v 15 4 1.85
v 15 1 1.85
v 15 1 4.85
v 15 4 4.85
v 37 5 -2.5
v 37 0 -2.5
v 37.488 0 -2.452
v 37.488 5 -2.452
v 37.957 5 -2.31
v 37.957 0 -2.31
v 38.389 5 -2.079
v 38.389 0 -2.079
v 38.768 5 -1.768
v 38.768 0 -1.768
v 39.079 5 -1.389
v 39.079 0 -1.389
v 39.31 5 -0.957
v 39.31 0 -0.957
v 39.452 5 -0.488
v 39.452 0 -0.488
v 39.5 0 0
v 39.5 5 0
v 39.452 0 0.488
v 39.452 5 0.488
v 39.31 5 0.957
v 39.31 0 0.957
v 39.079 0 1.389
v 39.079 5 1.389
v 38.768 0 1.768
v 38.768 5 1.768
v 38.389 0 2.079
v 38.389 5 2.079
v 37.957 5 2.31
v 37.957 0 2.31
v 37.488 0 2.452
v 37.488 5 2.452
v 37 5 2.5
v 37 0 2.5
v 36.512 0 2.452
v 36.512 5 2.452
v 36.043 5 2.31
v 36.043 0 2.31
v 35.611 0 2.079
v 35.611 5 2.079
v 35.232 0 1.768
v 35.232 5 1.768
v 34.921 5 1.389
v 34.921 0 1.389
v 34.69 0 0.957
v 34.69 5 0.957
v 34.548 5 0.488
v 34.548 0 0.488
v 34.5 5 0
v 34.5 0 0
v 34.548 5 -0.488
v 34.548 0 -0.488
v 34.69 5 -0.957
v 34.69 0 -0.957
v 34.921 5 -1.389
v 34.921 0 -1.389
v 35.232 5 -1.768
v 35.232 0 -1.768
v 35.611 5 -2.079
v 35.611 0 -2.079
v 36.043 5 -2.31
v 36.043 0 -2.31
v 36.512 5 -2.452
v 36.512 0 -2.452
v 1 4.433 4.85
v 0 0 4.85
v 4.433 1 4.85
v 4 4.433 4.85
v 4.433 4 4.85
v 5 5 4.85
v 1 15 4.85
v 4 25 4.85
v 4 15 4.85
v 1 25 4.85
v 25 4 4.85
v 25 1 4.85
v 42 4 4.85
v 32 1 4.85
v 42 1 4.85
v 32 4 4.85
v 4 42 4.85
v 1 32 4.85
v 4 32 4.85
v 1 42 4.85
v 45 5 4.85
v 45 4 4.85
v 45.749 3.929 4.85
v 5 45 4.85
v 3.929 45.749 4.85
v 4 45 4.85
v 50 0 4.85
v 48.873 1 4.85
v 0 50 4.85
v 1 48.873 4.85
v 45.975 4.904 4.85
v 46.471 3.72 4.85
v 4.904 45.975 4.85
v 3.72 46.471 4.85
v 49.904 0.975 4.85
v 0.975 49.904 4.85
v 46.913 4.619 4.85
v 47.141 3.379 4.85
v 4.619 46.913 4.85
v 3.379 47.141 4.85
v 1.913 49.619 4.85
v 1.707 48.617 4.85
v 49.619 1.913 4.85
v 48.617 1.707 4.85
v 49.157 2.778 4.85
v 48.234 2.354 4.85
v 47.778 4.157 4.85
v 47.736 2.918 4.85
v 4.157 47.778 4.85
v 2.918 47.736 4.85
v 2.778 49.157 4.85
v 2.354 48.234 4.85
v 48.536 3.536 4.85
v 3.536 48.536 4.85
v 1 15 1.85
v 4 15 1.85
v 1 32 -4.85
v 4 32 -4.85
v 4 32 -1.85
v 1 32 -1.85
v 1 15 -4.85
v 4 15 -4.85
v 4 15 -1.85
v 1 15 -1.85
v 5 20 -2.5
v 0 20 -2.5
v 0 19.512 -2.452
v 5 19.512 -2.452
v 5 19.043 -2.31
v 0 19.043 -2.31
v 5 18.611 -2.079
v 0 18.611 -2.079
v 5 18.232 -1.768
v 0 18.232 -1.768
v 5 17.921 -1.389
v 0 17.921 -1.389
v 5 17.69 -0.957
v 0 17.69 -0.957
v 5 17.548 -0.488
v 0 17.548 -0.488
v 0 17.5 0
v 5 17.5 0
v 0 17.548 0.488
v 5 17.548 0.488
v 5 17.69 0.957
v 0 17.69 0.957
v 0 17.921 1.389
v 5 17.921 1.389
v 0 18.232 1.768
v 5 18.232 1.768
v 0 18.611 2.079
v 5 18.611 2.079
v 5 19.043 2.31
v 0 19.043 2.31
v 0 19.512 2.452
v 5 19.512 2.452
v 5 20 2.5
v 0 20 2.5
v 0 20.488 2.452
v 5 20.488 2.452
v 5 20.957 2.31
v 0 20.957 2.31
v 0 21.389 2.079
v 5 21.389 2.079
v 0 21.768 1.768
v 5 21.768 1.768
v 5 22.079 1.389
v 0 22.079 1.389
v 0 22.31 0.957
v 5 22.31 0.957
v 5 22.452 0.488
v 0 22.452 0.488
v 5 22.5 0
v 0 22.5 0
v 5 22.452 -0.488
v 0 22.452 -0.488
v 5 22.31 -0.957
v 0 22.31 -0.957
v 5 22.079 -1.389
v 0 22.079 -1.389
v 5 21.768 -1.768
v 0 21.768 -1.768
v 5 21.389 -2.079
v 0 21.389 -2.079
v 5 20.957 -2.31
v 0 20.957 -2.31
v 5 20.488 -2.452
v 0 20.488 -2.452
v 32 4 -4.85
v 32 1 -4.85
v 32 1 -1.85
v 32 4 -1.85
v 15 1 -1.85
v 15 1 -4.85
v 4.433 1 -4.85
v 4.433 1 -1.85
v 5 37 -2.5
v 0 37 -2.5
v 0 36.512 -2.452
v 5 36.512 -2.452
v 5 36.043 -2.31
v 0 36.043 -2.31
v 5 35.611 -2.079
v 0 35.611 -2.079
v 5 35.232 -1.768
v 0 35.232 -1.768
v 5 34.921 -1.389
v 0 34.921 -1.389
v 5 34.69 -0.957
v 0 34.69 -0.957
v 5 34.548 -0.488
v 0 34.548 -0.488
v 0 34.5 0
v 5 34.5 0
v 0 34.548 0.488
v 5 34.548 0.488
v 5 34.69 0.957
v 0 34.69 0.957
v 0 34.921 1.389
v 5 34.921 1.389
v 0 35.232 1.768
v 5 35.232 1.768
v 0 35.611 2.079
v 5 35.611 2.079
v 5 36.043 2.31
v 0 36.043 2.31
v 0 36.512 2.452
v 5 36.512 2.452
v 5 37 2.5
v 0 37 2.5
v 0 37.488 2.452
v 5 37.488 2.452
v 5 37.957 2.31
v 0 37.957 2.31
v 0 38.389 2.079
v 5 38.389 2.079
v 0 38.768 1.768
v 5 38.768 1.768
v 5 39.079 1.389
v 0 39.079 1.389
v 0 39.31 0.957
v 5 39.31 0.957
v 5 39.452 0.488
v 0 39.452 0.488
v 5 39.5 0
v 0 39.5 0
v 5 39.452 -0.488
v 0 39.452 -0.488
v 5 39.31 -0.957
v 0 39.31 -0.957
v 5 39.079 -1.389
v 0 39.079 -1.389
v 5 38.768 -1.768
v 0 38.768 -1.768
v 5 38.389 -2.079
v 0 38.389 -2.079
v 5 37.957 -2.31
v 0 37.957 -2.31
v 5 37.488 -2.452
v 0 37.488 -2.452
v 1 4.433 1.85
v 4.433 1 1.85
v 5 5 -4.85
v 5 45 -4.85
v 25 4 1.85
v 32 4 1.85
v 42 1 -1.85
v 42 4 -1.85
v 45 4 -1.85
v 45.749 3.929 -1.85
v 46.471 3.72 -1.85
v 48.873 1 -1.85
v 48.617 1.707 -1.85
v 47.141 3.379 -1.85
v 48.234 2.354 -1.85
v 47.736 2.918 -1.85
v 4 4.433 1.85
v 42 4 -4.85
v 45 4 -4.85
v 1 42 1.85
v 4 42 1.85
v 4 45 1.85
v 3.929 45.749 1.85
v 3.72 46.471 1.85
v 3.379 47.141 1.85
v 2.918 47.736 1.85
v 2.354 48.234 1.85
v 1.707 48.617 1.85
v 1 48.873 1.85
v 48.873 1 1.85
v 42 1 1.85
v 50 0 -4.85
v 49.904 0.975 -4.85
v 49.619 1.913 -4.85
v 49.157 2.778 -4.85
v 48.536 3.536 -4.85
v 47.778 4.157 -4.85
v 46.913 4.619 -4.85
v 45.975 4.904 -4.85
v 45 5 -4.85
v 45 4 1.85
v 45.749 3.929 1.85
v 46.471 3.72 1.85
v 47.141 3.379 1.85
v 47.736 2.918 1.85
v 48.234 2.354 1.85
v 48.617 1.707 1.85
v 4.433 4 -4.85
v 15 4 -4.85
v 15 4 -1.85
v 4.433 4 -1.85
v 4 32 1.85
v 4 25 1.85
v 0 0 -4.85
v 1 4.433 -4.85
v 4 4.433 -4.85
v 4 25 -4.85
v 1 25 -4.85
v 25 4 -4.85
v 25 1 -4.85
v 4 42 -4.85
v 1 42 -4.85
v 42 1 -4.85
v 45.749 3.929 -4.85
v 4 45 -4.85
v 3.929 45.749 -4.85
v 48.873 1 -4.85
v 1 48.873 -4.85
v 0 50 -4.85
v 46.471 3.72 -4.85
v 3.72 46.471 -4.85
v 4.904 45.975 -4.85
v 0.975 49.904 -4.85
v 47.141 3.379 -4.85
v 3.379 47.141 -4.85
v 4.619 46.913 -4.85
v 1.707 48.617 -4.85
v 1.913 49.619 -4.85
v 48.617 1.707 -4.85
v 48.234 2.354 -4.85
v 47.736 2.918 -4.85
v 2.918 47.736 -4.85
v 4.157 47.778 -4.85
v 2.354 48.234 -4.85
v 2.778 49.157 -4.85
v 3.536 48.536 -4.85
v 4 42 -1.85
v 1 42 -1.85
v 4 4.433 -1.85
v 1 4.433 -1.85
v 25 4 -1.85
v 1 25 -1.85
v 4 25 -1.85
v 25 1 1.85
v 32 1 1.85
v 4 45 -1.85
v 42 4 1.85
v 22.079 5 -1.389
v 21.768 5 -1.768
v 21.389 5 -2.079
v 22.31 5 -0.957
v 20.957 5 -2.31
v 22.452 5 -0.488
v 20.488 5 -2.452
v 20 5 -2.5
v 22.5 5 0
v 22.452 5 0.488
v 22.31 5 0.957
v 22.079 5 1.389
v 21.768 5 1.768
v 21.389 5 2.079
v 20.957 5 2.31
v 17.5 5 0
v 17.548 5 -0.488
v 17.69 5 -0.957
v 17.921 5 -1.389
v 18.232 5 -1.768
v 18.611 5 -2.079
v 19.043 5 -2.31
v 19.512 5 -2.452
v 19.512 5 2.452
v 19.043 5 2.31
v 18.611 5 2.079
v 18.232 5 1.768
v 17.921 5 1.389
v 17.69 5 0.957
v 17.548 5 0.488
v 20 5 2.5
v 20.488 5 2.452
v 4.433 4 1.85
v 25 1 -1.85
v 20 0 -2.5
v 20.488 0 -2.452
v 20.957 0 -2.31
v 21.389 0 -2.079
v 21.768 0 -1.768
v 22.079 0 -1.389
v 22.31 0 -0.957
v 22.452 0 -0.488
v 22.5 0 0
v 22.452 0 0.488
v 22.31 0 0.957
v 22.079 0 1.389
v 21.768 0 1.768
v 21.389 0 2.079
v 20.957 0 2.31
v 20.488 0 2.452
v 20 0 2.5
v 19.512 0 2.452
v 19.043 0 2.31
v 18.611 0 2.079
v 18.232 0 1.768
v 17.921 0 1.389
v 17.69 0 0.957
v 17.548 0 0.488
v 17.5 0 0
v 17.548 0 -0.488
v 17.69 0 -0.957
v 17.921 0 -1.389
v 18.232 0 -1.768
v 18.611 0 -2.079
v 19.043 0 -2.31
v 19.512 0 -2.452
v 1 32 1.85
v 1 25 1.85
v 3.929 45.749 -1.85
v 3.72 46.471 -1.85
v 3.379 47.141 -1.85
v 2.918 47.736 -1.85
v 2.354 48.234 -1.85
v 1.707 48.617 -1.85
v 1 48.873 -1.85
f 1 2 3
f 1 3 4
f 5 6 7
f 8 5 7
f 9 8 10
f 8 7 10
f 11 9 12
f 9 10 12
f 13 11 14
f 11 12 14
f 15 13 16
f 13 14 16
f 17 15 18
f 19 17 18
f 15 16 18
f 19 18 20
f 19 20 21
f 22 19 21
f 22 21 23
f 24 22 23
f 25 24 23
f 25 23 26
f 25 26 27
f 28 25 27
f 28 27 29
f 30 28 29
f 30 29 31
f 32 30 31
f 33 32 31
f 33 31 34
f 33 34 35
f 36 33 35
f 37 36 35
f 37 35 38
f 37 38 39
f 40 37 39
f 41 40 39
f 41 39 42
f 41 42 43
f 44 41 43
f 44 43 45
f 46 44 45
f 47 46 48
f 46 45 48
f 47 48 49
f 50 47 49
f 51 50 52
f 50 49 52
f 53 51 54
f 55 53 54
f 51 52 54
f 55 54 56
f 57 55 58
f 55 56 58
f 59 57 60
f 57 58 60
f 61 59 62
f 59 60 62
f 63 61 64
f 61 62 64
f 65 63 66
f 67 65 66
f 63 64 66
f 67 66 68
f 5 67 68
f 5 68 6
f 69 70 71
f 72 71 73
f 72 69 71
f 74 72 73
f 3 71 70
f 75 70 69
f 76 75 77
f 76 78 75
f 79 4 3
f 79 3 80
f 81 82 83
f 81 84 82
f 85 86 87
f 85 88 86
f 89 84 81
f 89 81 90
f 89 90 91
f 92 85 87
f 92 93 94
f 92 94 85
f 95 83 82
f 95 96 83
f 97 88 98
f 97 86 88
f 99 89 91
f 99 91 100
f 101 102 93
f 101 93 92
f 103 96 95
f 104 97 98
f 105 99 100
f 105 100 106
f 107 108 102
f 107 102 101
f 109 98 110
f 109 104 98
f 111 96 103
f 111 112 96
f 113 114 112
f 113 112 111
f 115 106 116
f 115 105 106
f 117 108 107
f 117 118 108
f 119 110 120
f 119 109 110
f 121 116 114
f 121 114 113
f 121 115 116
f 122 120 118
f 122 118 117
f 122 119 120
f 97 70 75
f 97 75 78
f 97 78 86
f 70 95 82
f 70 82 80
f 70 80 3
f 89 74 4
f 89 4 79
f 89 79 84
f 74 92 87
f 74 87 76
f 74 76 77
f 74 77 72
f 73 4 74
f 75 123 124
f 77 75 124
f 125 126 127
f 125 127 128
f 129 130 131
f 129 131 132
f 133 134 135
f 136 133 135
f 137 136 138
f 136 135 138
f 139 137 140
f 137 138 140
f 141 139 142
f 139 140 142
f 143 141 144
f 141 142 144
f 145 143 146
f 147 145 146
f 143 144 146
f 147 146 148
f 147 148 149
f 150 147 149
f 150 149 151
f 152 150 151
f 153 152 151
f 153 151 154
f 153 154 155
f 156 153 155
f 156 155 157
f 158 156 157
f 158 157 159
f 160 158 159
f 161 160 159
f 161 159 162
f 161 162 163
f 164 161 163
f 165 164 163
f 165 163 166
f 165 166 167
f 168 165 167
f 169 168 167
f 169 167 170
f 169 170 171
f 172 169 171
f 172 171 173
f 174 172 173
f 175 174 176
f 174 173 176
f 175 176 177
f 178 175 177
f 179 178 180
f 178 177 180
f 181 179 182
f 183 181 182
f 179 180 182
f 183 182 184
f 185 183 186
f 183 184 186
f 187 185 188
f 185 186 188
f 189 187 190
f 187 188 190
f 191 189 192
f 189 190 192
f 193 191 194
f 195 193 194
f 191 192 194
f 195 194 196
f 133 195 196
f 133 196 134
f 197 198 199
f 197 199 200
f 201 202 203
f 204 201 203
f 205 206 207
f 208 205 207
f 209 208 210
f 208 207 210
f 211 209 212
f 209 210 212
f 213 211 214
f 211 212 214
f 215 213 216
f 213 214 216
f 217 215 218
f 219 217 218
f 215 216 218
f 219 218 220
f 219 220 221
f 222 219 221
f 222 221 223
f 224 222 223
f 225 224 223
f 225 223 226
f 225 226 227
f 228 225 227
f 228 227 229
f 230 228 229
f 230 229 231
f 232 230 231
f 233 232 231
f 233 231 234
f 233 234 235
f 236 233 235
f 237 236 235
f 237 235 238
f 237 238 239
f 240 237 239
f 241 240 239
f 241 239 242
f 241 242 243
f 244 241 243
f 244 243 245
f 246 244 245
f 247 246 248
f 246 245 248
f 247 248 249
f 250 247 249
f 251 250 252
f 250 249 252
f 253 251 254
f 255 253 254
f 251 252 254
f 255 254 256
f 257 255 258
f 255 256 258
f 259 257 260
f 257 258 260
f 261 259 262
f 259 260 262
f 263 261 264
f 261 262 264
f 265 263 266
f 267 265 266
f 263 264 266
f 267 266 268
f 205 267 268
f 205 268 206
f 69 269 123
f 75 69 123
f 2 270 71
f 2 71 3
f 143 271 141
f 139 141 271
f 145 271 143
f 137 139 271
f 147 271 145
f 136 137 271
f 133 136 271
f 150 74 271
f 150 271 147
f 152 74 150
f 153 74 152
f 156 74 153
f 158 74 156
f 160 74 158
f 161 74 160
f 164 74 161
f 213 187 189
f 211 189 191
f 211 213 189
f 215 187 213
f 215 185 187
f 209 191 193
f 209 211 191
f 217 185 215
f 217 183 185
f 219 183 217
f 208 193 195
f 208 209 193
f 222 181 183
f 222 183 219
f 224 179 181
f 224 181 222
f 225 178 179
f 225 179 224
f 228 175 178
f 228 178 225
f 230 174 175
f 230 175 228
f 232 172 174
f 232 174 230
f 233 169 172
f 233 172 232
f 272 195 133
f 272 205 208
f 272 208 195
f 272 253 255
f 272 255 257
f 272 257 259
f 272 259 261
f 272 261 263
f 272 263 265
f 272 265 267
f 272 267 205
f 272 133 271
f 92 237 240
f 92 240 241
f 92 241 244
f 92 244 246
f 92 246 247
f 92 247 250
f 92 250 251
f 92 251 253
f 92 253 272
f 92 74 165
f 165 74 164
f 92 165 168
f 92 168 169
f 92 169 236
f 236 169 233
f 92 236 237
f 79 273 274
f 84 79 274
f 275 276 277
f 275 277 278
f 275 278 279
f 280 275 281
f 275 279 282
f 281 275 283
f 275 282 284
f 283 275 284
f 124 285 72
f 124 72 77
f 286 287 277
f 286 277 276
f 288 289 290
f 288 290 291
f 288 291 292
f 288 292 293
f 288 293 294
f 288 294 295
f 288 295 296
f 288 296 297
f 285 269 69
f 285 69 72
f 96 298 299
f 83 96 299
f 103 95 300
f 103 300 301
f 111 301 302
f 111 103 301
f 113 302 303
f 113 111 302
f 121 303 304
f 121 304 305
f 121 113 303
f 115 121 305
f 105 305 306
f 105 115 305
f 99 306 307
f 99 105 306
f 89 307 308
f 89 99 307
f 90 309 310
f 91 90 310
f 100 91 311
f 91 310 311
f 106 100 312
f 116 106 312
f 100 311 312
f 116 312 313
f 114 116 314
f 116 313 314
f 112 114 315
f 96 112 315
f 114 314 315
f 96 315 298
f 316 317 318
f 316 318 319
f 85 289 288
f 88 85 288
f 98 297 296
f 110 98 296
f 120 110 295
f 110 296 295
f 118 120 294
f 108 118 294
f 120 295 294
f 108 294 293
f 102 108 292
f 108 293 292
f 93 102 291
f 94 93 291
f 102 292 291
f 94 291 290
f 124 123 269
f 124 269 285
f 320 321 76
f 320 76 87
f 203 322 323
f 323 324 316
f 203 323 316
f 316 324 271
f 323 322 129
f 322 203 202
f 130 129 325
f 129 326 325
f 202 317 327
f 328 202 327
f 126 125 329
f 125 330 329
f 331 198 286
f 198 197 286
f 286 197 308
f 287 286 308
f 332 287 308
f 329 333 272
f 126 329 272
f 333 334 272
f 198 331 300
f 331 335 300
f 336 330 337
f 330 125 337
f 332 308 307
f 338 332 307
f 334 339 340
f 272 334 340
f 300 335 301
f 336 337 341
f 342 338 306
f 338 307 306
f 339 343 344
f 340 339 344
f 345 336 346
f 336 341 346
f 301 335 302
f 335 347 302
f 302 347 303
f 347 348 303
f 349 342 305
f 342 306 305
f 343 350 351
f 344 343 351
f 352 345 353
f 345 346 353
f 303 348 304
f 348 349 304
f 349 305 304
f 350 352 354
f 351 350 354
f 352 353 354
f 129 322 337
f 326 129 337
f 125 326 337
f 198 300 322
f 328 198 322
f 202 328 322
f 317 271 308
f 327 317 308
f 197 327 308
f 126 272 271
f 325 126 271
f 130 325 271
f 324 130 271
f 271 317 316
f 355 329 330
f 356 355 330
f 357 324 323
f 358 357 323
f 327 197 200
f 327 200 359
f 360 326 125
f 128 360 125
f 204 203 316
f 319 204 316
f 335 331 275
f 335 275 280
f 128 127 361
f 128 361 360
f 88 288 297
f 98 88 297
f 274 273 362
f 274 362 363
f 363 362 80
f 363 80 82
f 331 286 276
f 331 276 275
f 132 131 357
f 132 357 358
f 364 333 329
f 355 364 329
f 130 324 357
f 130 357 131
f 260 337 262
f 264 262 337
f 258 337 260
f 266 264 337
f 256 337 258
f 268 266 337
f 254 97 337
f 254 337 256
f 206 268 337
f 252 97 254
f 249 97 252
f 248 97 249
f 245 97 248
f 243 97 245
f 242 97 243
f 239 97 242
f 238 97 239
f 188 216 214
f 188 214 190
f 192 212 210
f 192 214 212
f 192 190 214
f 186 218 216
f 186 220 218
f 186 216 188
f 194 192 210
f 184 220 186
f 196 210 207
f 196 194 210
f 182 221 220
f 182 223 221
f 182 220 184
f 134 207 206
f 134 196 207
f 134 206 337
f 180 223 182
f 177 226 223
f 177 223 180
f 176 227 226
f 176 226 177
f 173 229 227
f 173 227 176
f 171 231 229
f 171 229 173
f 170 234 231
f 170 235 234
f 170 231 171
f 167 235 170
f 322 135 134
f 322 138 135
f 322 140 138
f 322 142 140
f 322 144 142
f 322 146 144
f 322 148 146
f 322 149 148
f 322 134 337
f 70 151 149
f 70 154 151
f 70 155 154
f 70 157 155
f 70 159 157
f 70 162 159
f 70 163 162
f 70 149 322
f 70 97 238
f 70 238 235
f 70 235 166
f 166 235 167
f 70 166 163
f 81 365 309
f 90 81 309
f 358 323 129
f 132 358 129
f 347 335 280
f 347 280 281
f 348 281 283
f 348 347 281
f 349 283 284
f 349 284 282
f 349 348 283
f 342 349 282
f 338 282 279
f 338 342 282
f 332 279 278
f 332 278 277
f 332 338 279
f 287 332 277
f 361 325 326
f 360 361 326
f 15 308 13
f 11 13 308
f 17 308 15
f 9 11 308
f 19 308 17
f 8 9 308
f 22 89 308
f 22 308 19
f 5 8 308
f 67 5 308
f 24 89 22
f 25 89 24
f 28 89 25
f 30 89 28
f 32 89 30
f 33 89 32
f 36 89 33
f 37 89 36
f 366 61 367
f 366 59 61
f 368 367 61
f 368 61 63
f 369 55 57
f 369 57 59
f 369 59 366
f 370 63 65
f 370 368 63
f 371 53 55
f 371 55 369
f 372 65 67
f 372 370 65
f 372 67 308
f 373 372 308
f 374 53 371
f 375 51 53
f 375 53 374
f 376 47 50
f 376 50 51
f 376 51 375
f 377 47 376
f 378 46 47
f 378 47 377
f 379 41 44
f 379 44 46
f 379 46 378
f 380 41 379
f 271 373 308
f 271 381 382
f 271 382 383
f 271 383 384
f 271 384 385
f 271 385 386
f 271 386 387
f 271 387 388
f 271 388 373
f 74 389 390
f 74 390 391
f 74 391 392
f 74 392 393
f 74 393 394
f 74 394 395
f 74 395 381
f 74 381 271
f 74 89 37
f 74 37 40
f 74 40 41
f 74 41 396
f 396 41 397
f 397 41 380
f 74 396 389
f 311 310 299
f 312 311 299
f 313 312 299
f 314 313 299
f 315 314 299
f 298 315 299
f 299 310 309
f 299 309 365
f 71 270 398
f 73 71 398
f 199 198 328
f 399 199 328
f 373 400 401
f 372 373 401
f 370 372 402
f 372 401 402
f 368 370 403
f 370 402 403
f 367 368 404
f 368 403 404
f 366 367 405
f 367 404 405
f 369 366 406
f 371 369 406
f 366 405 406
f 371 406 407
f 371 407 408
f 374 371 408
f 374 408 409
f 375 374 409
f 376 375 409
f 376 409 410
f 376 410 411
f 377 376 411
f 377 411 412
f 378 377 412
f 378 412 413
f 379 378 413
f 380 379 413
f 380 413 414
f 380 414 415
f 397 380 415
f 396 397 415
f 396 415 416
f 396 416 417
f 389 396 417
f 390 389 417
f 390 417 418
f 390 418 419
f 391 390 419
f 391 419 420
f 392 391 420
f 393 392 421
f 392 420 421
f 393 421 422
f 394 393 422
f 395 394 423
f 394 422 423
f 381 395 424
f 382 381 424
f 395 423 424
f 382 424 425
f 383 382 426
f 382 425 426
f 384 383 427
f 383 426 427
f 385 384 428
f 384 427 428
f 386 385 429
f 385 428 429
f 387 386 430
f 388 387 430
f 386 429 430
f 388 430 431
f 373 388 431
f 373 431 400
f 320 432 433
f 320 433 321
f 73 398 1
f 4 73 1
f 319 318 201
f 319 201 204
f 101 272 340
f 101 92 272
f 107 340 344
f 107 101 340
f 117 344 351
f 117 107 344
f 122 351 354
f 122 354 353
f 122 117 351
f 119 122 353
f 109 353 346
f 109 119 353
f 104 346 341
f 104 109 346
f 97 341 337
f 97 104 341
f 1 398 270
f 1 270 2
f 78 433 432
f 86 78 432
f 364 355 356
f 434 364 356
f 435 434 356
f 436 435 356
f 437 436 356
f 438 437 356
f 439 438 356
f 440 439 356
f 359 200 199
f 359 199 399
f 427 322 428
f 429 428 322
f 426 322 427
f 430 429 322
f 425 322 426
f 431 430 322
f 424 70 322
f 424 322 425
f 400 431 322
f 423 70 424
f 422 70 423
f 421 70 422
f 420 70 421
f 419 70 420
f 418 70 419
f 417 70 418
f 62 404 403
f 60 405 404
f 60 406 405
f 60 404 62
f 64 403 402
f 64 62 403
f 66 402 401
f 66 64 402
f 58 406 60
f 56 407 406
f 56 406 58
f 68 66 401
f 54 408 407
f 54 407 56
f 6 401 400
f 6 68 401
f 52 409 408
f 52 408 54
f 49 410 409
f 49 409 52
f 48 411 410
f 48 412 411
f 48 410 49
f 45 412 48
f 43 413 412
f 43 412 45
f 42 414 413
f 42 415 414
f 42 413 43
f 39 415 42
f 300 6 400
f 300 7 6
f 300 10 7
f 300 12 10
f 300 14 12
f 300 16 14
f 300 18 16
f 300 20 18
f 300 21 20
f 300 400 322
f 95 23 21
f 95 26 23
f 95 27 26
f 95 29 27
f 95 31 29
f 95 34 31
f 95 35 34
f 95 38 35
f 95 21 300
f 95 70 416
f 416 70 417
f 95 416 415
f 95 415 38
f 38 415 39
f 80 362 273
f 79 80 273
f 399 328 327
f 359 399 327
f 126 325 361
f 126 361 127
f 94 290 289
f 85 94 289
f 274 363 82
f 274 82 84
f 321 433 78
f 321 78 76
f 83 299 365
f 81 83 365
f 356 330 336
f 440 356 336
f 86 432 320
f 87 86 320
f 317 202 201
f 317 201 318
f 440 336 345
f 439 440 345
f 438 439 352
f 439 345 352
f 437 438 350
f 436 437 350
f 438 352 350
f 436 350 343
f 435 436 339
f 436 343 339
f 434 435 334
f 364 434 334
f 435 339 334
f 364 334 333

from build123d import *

# Parameters (mm, degrees)
EXTRUDE_1_DEPTH        = 4.85
HOLE_WIZARD_M6_1_D     = 5
HOLE_WIZARD_M6_1_DEPTH = 23
HOLE_WIZARD_M6_1_TIP   = 1.502151548
HOLE_WIZARD_M6_2_D     = 5
HOLE_WIZARD_M6_2_DEPTH = 23
HOLE_WIZARD_M6_2_TIP   = 1.502151548
SKETCH_7_W             = 3
SKETCH_7_H             = 10.567492921
SKETCH_7_W_2           = 10.567492921
SKETCH_7_H_2           = 3
SKETCH_7_W_3           = 7
SKETCH_7_H_3           = 7
CUT_EXTRUDE_1_DEPTH    = 3
CUT_EXTRUDE_START      = -3
SKETCH_8_W             = 3
SKETCH_8_H             = 10.567492921
SKETCH_8_H_2           = 7
SKETCH_8_W_2           = 10.567492921
SKETCH_8_H_3           = 3
SKETCH_8_W_3           = 7
CUT_EXTRUDE_2_DEPTH    = 3


with BuildPart() as part:
    # 草图1 → 凸台-拉伸1 (new, symmetric)
    with BuildSketch(Plane.XY):
        with BuildLine():
            Line((0, 50), (0, 0))
            Line((0, 0), (50, 0))
            ThreePointArc((50, 0), (48.535533906, 3.535533906), (45, 5))
            Line((45, 5), (5, 5))
            Line((5, 5), (5, 45))
            ThreePointArc((5, 45), (3.535533906, 48.535533906), (0, 50))
        make_face()
    extrude(amount=EXTRUDE_1_DEPTH, both=True)

    # M6 螺纹孔1
    with Locations(Plane(origin=(5, 37, 0), x_dir=(0, 0, 1), z_dir=(1, 0, 0))):
        with Locations((0, 0), (0, 17)):
            Hole(HOLE_WIZARD_M6_1_D / 2, depth=HOLE_WIZARD_M6_1_DEPTH)
            with Locations((0, 0, -(HOLE_WIZARD_M6_1_DEPTH + HOLE_WIZARD_M6_1_TIP / 2))):  # 118° drill point
                Cone(0, HOLE_WIZARD_M6_1_D / 2, HOLE_WIZARD_M6_1_TIP, mode=Mode.SUBTRACT)

    # M6 螺纹孔2
    with Locations(Plane(origin=(20, 5, 0), x_dir=(0, 0, 1), z_dir=(0, 1, 0))):
        with Locations((0, 0), (0, 17)):
            Hole(HOLE_WIZARD_M6_2_D / 2, depth=HOLE_WIZARD_M6_2_DEPTH)
            with Locations((0, 0, -(HOLE_WIZARD_M6_2_DEPTH + HOLE_WIZARD_M6_2_TIP / 2))):  # 118° drill point
                Cone(0, HOLE_WIZARD_M6_2_D / 2, HOLE_WIZARD_M6_2_TIP, mode=Mode.SUBTRACT)

    # 草图7 → 切除-拉伸1 (cut)
    with BuildSketch(Plane(origin=(0, 0, -4.85), x_dir=(-1, 0, 0), z_dir=(0, 0, -1))):
        with Locations((-2.5, 9.71625354)):
            Rectangle(SKETCH_7_W, SKETCH_7_H)
        with Locations((-9.71625354, 2.5)):
            Rectangle(SKETCH_7_W_2, SKETCH_7_H_2)
        with BuildLine():
            Line((-4, 42), (-1, 42))
            Line((-1, 42), (-1, 48.872983346))
            ThreePointArc((-1, 48.872983346), (-3.16227766, 47.449489743), (-4, 45))
            Line((-4, 45), (-4, 42))
        make_face()
        with BuildLine():
            Line((-42, 4), (-42, 1))
            Line((-42, 1), (-48.872983346, 1))
            ThreePointArc((-48.872983346, 1), (-47.449489743, 3.16227766), (-45, 4))
            Line((-45, 4), (-42, 4))
        make_face()
        with Locations((-28.5, 2.5)):
            Rectangle(SKETCH_7_W_3, SKETCH_7_H_2)
        with Locations((-2.5, 28.5)):
            Rectangle(SKETCH_7_W, SKETCH_7_H_3)
    extrude(amount=-CUT_EXTRUDE_1_DEPTH, mode=Mode.SUBTRACT)

    # 草图8 → 切除-拉伸2 (cut)
    with BuildSketch(Plane.XY.offset(4.85).offset(CUT_EXTRUDE_START)):
        with BuildLine():
            Line((1, 42), (1, 48.872983346))
            ThreePointArc((1, 48.872983346), (3.16227766, 47.449489743), (4, 45))
            Line((4, 45), (4, 42))
            Line((4, 42), (1, 42))
        make_face()
        with BuildLine():
            Line((42, 4), (45, 4))
            ThreePointArc((45, 4), (47.449489743, 3.16227766), (48.872983346, 1))
            Line((48.872983346, 1), (42, 1))
            Line((42, 1), (42, 4))
        make_face()
        with Locations((2.5, 9.71625354)):
            Rectangle(SKETCH_8_W, SKETCH_8_H)
        with Locations((2.5, 28.5)):
            Rectangle(SKETCH_8_W, SKETCH_8_H_2)
        with Locations((9.71625354, 2.5)):
            Rectangle(SKETCH_8_W_2, SKETCH_8_H_3)
        with Locations((28.5, 2.5)):
            Rectangle(SKETCH_8_W_3, SKETCH_8_H_3)
    extrude(amount=CUT_EXTRUDE_2_DEPTH, mode=Mode.SUBTRACT)


solid = part.part
